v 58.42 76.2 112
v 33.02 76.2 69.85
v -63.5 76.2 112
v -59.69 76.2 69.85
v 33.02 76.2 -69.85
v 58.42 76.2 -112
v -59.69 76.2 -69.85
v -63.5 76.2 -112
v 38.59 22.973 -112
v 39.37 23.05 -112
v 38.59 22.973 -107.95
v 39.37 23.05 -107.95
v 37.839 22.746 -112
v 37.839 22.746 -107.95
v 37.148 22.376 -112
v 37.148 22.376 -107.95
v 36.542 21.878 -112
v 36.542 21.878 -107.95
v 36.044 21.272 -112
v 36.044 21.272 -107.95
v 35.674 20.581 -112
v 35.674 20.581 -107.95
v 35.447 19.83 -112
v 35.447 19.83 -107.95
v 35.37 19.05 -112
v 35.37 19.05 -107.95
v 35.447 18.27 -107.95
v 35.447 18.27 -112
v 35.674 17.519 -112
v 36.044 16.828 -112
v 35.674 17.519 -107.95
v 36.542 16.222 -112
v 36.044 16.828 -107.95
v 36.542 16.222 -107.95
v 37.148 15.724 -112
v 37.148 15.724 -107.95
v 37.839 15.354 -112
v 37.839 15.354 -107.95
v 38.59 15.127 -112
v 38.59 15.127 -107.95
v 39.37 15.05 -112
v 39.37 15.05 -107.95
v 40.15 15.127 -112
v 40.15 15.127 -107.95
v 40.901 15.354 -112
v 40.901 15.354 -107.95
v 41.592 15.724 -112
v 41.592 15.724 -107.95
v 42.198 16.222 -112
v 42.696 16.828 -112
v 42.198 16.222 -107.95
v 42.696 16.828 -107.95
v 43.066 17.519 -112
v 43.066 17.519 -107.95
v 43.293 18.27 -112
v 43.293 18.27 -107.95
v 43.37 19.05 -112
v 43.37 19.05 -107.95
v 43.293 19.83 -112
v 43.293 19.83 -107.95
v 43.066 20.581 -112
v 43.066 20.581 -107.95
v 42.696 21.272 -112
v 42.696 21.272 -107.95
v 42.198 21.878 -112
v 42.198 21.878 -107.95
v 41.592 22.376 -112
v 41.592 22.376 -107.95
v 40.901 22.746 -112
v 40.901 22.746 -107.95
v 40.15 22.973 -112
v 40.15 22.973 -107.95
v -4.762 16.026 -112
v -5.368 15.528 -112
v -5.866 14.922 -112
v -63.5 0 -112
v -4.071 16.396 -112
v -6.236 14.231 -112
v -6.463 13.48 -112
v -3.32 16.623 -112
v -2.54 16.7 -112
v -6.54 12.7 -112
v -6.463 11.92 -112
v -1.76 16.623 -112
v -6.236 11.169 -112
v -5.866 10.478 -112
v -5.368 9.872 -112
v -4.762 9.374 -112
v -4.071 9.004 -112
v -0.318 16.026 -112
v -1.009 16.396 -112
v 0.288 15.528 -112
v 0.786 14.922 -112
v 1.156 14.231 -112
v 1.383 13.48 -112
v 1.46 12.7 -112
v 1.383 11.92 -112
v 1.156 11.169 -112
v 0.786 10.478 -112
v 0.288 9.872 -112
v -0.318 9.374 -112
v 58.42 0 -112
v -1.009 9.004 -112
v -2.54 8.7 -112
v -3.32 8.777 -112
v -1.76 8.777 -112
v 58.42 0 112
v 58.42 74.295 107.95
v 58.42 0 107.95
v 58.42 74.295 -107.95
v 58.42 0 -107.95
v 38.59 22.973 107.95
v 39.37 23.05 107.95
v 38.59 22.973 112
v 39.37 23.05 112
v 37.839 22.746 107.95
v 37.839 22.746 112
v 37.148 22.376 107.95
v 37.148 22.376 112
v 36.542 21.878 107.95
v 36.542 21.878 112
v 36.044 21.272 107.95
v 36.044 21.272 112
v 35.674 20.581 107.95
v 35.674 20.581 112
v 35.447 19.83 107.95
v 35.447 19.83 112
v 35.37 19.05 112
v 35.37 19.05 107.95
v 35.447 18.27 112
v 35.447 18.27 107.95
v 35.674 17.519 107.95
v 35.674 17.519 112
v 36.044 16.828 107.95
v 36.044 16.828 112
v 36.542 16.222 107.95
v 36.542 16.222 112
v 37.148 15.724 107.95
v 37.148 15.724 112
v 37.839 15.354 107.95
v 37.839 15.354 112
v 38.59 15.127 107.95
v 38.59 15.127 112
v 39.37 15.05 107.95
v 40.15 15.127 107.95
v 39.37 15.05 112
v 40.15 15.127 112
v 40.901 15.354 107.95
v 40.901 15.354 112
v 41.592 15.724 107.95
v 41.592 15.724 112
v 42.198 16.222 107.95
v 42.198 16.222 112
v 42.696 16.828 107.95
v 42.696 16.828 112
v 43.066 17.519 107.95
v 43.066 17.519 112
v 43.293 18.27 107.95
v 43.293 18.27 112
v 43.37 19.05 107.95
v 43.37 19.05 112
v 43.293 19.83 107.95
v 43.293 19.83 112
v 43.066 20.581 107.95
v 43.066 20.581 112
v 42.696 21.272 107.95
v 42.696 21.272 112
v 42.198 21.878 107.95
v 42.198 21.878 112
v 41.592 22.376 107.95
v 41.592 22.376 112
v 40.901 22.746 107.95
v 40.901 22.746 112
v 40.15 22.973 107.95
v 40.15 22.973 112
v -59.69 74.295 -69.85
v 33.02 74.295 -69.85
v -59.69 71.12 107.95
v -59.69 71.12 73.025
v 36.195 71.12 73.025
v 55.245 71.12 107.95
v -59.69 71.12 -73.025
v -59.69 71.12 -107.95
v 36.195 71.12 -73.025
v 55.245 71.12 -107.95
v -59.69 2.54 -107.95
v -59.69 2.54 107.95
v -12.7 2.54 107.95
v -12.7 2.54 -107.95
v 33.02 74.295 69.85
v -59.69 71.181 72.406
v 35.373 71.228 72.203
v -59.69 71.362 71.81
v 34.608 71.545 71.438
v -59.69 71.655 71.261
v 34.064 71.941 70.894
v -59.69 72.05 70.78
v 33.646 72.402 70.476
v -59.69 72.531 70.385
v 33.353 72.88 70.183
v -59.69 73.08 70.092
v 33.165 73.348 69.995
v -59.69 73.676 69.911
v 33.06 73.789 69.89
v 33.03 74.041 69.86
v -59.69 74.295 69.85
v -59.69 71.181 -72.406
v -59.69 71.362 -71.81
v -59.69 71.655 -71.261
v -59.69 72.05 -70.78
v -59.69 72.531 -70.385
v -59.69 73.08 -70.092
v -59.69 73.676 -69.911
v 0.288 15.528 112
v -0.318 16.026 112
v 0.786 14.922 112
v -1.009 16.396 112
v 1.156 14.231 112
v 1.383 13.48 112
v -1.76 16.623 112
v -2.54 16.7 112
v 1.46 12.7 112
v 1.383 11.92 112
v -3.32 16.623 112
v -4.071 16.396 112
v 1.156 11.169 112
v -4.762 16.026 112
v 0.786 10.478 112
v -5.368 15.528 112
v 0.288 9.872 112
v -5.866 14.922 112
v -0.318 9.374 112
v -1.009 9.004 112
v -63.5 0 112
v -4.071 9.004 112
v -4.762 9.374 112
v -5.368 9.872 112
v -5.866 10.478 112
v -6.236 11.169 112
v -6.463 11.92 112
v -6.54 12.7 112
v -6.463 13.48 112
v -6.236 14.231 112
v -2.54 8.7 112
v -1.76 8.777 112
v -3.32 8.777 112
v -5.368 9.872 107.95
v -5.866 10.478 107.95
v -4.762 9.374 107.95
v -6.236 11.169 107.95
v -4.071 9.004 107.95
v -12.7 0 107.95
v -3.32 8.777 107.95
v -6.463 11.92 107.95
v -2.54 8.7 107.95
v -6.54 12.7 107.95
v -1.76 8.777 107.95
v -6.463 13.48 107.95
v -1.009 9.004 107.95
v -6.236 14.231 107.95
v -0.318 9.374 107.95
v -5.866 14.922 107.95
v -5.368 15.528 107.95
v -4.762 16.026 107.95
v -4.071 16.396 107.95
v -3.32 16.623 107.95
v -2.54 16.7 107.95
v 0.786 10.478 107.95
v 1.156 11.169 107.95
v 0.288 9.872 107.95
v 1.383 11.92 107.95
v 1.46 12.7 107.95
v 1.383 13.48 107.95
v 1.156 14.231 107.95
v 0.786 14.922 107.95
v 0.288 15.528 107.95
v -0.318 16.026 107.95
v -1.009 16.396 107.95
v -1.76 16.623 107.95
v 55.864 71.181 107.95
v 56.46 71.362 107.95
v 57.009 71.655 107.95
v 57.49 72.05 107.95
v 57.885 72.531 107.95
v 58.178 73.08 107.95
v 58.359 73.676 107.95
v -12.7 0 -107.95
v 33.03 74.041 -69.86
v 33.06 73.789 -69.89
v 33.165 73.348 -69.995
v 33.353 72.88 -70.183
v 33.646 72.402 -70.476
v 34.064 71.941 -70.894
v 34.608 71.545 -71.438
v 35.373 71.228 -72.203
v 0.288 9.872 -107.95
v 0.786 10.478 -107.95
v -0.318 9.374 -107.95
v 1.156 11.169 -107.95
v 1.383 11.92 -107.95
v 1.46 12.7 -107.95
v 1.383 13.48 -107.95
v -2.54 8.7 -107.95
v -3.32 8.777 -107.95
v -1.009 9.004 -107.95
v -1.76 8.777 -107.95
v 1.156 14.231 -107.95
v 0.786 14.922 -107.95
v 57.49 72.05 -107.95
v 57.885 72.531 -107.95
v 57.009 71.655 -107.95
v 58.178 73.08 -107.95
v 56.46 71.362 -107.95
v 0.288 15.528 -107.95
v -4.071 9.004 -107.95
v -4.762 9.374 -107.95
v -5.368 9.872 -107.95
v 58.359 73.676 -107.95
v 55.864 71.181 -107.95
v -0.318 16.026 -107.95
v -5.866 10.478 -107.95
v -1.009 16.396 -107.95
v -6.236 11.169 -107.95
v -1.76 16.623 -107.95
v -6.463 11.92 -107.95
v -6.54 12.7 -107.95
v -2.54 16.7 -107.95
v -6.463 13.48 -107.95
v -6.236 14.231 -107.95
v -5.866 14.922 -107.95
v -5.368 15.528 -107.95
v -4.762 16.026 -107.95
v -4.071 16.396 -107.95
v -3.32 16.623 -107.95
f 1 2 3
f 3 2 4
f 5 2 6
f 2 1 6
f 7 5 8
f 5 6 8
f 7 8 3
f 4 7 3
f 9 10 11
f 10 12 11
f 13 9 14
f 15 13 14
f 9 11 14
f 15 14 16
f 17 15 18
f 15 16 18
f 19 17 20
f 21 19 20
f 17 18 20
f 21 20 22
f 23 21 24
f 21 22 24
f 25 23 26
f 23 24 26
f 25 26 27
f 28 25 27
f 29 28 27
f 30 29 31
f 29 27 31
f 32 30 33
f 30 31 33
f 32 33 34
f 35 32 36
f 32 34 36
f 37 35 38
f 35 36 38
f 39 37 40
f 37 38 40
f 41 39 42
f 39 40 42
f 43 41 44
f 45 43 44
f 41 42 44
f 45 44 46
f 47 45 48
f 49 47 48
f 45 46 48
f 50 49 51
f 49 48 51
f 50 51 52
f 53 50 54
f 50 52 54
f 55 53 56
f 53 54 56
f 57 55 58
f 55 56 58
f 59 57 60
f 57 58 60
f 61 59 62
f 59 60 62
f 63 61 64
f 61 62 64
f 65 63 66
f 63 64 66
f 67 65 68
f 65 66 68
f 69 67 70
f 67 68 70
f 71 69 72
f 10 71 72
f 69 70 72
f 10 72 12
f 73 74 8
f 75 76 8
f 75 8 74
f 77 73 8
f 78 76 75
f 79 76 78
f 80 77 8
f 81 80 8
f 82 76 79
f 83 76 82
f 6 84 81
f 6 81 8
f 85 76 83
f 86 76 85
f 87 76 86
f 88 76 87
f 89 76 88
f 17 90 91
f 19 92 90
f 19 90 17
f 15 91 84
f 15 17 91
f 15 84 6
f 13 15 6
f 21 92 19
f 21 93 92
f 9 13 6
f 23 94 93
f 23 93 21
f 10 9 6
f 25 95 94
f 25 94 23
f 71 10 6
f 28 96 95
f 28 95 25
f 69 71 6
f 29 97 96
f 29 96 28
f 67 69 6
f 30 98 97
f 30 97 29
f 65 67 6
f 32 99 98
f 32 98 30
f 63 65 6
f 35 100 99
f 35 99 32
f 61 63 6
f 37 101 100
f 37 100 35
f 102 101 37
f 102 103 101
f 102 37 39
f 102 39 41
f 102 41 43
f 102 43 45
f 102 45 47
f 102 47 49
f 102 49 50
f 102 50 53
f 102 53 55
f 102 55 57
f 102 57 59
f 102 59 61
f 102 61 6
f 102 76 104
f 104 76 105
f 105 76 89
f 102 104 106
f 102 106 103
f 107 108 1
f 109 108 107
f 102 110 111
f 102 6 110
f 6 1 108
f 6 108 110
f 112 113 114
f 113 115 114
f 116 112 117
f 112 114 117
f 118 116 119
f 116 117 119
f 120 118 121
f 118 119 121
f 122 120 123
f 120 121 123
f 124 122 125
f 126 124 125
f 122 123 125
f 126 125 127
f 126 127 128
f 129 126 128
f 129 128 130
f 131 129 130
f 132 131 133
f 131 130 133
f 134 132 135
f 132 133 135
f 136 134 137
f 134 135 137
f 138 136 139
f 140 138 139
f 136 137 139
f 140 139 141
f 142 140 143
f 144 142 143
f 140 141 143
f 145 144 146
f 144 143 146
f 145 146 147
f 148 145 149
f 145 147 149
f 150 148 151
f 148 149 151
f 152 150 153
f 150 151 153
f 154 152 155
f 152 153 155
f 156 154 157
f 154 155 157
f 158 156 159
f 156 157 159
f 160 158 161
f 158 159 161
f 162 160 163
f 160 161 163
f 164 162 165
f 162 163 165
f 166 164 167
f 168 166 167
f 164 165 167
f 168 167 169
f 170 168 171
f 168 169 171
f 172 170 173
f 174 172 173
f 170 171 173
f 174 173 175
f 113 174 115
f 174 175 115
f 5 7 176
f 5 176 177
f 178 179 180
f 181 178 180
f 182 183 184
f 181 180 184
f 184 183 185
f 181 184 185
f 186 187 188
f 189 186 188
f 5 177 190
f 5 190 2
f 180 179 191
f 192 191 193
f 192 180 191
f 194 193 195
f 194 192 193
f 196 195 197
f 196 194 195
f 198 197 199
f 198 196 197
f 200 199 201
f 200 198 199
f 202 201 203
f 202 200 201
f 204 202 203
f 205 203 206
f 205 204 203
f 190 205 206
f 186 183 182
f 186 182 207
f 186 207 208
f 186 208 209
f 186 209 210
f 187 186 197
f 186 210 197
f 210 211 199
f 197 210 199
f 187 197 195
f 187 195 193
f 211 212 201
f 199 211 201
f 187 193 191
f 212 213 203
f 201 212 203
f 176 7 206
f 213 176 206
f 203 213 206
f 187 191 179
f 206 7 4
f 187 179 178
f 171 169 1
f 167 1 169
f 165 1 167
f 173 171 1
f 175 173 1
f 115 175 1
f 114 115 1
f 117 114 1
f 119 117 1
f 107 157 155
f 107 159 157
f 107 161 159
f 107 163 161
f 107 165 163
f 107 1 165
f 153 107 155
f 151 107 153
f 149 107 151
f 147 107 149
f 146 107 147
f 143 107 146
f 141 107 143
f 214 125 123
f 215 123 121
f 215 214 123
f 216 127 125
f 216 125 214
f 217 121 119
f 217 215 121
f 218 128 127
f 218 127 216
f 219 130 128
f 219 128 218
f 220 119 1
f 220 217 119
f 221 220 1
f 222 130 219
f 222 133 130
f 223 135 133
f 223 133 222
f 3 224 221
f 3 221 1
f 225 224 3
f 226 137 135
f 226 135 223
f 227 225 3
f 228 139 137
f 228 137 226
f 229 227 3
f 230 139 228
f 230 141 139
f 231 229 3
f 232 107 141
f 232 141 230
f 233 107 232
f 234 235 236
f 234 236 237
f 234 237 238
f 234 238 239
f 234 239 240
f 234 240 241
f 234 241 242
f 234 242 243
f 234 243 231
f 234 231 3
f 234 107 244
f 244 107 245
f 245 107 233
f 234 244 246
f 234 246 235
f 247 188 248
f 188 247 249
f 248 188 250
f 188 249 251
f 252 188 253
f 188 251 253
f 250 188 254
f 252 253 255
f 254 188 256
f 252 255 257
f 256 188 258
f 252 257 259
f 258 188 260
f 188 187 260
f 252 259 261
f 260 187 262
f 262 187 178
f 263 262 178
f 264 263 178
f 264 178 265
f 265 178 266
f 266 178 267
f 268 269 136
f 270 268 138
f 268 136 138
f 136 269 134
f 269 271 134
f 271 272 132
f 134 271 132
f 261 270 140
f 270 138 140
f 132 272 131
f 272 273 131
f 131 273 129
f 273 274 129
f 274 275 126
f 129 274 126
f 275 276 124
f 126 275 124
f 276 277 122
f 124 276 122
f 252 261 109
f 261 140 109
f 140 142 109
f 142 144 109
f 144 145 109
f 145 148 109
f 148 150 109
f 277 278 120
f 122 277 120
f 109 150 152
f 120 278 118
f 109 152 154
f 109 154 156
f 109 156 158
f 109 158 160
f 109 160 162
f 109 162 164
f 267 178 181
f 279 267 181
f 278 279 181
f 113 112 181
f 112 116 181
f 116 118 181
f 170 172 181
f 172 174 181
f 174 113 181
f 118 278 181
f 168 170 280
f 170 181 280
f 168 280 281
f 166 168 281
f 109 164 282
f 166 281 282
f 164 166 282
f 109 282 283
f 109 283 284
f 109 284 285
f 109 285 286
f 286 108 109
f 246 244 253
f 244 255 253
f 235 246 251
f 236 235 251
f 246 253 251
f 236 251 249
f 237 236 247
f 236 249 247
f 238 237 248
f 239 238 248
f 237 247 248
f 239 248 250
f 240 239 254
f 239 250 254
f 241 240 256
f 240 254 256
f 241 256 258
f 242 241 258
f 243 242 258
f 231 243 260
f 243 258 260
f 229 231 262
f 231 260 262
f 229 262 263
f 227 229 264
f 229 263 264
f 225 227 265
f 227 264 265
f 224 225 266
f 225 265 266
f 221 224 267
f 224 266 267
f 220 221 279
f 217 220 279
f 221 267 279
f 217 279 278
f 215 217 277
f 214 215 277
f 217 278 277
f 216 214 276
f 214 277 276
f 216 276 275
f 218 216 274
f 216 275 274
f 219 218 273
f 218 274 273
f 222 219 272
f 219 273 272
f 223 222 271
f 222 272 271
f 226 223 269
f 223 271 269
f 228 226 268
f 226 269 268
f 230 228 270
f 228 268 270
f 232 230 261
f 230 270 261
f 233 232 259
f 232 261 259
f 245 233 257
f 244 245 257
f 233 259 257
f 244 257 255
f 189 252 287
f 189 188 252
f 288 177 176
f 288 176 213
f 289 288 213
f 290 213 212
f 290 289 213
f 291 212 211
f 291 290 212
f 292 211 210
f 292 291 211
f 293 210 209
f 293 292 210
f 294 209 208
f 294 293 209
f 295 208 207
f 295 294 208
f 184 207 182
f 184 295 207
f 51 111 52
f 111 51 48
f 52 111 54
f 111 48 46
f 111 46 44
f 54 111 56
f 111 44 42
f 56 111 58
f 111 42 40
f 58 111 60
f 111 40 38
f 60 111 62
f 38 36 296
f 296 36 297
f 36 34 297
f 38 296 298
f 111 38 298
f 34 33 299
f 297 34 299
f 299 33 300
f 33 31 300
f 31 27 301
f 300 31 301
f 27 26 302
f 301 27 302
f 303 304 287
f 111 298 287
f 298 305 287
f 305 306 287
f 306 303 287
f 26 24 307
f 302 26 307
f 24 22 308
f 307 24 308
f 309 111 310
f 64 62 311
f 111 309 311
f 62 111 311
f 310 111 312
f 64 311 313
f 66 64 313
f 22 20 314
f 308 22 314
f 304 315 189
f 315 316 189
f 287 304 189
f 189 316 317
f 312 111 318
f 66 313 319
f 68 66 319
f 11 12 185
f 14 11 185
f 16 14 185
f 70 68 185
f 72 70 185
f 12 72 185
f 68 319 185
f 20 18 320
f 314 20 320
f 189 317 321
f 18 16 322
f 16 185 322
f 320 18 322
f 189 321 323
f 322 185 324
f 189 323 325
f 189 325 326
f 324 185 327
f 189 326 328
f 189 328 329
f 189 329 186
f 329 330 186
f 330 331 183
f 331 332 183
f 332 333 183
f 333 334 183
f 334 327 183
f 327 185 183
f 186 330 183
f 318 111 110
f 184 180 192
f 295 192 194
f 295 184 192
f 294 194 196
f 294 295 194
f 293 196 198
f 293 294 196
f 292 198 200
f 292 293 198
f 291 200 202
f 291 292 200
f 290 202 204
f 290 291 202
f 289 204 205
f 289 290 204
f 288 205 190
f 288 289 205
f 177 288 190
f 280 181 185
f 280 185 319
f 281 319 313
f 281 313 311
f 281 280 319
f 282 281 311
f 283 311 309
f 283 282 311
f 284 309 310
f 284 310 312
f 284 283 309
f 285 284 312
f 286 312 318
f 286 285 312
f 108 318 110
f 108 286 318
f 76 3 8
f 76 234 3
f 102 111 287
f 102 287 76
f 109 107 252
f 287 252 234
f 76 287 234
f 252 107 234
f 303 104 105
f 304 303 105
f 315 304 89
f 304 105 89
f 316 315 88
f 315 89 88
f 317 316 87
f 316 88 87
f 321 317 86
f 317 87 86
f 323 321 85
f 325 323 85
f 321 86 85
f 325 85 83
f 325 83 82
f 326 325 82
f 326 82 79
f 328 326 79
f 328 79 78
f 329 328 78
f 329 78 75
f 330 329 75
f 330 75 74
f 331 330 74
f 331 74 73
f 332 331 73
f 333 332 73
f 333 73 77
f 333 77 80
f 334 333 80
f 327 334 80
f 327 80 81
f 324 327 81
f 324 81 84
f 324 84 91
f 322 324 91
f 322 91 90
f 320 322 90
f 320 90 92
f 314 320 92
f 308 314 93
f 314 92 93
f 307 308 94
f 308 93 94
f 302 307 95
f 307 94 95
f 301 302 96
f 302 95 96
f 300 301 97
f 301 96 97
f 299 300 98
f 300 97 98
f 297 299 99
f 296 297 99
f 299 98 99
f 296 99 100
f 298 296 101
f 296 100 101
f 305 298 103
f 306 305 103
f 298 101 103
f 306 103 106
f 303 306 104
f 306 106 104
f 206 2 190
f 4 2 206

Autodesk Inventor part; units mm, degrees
ref_plane "YZ Plane" through (0, 0, 0) normal (1, 0, 0) x (0, 1, 0)
ref_plane "XZ Plane" through (0, 0, 0) normal (0, 1, 0) x (-1, 0, 0)
ref_plane "XY Plane" through (0, 0, 0) normal (0, 0, 1) x (1, 0, 0)
sketch "Sketch1" plane through (0, 0, 0) normal (0, 1, 0) x (-1, 0, 0)
  point P0 (0, 0)
sketch "Sketch2" plane through (0, 0, 0) normal (0, 1, 0) x (-1, 0, 0)
  line L0 (-63.5, 112) -> (63.5, 112)
  line L1 (63.5, 112) -> (63.5, -112)
  line L2 (63.5, -112) -> (-63.5, -112)
  line L3 (-63.5, -112) -> (-63.5, 112)
  line L4 (-63.5, 112) -> (63.5, -112) construction
  line L5 (63.5, 112) -> (-63.5, -112) construction
  point P0 (0, 0)
  dimension "d0" = 127
  dimension "d1" = 224
extrude "Extrusion1" add sketch "Sketch2" along normal blind 76.2
sketch "Sketch3" plane through (0, 76.2, 0) normal (0, 1, 0) x (1, 0, 0)
  line L0 (59.69, 107.95) -> (-59.69, 107.95)
  line L1 (-59.69, 107.95) -> (-59.69, -107.95)
  line L2 (-59.69, -107.95) -> (59.69, -107.95)
  line L3 (59.69, -107.95) -> (59.69, 107.95)
  line L4 (59.69, 107.95) -> (-59.69, -107.95) construction
  line L5 (-59.69, 107.95) -> (59.69, -107.95) construction
  point P0 (0, 0)
  dimension "d4" = 119.38
  dimension "d5" = 215.9
extrude "Extrusion2" cut sketch "Sketch3" against normal blind 73.66
sketch "Sketch4" plane through (-59.69, 76.2, -107.95) normal (0, 0, 1) x (1, 0, 0)
  line L0 (119.38, 0) -> (119.38, -73.66) projected
  line L1 (119.38, 0) -> (0, 0)
  line L2 (0, 0) -> (0, -5.08)
  line L3 (0, -5.08) -> (119.38, -5.08)
  line L4 (119.38, -5.08) -> (119.38, 0)
  point P0 (59.69, -76.2)
  dimension "d8" = 5.08
  dimension "d11" = 119.38
extrude "Extrusion3" add sketch "Sketch4" along normal blind 38.1
sketch "Sketch5" plane through (59.69, 76.2, 107.95) normal (0, 0, -1) x (-1, 0, 0)
  line L0 (0, 0) -> (119.38, 0)
  line L1 (119.38, 0) -> (119.38, -5.08)
  line L2 (119.38, -5.08) -> (0, -5.08)
  line L3 (0, -5.08) -> (0, 0)
  point P0 (59.69, -76.2)
  dimension "d12" = 5.08
extrude "Extrusion4" add sketch "Sketch5" along normal blind 38.1
sketch "Sketch7" plane through (63.5, 0, 112) normal (1, 0, 0) x (0, 0, -1)
  line L0 (224, 0) -> (0, 0) projected
  line L1 (224, 0) -> (224, 76.2) projected
  line L2 (0, 76.2) -> (224, 76.2) projected
  line L3 (0, 0) -> (0, 76.2) projected
  point P0 (112, 0)
extrude "Extrusion5" cut sketch "Sketch7" against normal blind 5.08
sketch "Sketch8" plane through (-59.69, 76.2, -69.85) normal (0, 0, 1) x (1, 0, 0)
  line L0 (0, -5.08) -> (118.11, -5.08) projected
  line L1 (118.11, 0) -> (0, 0) projected
  line L2 (118.11, -5.08) -> (92.71, -5.08)
  line L3 (92.71, -5.08) -> (92.71, 0)
  line L4 (92.71, 0) -> (118.11, 0)
  line L5 (118.11, 0) -> (118.11, -5.08)
  point P0 (59.69, -76.2)
  dimension "d17" = 25.4
extrude "Extrusion6" add sketch "Sketch8" along normal blind 139.7
sketch "Sketch9" plane through (58.42, 0, 112) normal (1, 0, 0) x (0, 0, -1)
  line L0 (219.95, 2.54) -> (219.95, 71.12) projected
  line L1 (219.95, 2.54) -> (4.05, 2.54)
  line L2 (4.05, 2.54) -> (4.05, 0)
  line L3 (4.05, 0) -> (219.95, 0)
  line L4 (219.95, 0) -> (219.95, 2.54)
  point P0 (112, 0)
extrude "Extrusion7" cut sketch "Sketch9" against normal blind 71.12
fillet "Fillet1" radius 3.175 1 edges at (58.42, 71.12, 0)
fillet "Fillet2" radius 3.175 1 edges at (-13.335, 71.12, -69.85)
fillet "Fillet3" radius 3.175 1 edges at (-13.335, 71.12, 69.85)
sketch "Sketch10" plane through (-63.5, 0, -112) normal (0, 0, -1) x (-1, 0, 0)
  circle A0 centre (-102.87, 19.05) radius 4
  point P0 (-63.5, 0)
  dimension "d27" = 8
hole "Hole1" at (39.37, 19.05, -112) direction (0, 0, 1) diameter 8 end through all
fillet "Fillet4" radius 3.175 1 edges at (33.02, 71.12, 0)
sketch "Sketch11" plane through (-63.5, 0, 112) normal (0, 0, 1) x (1, 0, 0)
  point P0 (63.5, 0)
  point P1 (60.96, 12.7)
hole "Hole2" at (-2.54, 12.7, 112) direction (0, 0, -1) diameter 8 end through all
properties part number "Bucket des 1" material "ABS Plastic"
